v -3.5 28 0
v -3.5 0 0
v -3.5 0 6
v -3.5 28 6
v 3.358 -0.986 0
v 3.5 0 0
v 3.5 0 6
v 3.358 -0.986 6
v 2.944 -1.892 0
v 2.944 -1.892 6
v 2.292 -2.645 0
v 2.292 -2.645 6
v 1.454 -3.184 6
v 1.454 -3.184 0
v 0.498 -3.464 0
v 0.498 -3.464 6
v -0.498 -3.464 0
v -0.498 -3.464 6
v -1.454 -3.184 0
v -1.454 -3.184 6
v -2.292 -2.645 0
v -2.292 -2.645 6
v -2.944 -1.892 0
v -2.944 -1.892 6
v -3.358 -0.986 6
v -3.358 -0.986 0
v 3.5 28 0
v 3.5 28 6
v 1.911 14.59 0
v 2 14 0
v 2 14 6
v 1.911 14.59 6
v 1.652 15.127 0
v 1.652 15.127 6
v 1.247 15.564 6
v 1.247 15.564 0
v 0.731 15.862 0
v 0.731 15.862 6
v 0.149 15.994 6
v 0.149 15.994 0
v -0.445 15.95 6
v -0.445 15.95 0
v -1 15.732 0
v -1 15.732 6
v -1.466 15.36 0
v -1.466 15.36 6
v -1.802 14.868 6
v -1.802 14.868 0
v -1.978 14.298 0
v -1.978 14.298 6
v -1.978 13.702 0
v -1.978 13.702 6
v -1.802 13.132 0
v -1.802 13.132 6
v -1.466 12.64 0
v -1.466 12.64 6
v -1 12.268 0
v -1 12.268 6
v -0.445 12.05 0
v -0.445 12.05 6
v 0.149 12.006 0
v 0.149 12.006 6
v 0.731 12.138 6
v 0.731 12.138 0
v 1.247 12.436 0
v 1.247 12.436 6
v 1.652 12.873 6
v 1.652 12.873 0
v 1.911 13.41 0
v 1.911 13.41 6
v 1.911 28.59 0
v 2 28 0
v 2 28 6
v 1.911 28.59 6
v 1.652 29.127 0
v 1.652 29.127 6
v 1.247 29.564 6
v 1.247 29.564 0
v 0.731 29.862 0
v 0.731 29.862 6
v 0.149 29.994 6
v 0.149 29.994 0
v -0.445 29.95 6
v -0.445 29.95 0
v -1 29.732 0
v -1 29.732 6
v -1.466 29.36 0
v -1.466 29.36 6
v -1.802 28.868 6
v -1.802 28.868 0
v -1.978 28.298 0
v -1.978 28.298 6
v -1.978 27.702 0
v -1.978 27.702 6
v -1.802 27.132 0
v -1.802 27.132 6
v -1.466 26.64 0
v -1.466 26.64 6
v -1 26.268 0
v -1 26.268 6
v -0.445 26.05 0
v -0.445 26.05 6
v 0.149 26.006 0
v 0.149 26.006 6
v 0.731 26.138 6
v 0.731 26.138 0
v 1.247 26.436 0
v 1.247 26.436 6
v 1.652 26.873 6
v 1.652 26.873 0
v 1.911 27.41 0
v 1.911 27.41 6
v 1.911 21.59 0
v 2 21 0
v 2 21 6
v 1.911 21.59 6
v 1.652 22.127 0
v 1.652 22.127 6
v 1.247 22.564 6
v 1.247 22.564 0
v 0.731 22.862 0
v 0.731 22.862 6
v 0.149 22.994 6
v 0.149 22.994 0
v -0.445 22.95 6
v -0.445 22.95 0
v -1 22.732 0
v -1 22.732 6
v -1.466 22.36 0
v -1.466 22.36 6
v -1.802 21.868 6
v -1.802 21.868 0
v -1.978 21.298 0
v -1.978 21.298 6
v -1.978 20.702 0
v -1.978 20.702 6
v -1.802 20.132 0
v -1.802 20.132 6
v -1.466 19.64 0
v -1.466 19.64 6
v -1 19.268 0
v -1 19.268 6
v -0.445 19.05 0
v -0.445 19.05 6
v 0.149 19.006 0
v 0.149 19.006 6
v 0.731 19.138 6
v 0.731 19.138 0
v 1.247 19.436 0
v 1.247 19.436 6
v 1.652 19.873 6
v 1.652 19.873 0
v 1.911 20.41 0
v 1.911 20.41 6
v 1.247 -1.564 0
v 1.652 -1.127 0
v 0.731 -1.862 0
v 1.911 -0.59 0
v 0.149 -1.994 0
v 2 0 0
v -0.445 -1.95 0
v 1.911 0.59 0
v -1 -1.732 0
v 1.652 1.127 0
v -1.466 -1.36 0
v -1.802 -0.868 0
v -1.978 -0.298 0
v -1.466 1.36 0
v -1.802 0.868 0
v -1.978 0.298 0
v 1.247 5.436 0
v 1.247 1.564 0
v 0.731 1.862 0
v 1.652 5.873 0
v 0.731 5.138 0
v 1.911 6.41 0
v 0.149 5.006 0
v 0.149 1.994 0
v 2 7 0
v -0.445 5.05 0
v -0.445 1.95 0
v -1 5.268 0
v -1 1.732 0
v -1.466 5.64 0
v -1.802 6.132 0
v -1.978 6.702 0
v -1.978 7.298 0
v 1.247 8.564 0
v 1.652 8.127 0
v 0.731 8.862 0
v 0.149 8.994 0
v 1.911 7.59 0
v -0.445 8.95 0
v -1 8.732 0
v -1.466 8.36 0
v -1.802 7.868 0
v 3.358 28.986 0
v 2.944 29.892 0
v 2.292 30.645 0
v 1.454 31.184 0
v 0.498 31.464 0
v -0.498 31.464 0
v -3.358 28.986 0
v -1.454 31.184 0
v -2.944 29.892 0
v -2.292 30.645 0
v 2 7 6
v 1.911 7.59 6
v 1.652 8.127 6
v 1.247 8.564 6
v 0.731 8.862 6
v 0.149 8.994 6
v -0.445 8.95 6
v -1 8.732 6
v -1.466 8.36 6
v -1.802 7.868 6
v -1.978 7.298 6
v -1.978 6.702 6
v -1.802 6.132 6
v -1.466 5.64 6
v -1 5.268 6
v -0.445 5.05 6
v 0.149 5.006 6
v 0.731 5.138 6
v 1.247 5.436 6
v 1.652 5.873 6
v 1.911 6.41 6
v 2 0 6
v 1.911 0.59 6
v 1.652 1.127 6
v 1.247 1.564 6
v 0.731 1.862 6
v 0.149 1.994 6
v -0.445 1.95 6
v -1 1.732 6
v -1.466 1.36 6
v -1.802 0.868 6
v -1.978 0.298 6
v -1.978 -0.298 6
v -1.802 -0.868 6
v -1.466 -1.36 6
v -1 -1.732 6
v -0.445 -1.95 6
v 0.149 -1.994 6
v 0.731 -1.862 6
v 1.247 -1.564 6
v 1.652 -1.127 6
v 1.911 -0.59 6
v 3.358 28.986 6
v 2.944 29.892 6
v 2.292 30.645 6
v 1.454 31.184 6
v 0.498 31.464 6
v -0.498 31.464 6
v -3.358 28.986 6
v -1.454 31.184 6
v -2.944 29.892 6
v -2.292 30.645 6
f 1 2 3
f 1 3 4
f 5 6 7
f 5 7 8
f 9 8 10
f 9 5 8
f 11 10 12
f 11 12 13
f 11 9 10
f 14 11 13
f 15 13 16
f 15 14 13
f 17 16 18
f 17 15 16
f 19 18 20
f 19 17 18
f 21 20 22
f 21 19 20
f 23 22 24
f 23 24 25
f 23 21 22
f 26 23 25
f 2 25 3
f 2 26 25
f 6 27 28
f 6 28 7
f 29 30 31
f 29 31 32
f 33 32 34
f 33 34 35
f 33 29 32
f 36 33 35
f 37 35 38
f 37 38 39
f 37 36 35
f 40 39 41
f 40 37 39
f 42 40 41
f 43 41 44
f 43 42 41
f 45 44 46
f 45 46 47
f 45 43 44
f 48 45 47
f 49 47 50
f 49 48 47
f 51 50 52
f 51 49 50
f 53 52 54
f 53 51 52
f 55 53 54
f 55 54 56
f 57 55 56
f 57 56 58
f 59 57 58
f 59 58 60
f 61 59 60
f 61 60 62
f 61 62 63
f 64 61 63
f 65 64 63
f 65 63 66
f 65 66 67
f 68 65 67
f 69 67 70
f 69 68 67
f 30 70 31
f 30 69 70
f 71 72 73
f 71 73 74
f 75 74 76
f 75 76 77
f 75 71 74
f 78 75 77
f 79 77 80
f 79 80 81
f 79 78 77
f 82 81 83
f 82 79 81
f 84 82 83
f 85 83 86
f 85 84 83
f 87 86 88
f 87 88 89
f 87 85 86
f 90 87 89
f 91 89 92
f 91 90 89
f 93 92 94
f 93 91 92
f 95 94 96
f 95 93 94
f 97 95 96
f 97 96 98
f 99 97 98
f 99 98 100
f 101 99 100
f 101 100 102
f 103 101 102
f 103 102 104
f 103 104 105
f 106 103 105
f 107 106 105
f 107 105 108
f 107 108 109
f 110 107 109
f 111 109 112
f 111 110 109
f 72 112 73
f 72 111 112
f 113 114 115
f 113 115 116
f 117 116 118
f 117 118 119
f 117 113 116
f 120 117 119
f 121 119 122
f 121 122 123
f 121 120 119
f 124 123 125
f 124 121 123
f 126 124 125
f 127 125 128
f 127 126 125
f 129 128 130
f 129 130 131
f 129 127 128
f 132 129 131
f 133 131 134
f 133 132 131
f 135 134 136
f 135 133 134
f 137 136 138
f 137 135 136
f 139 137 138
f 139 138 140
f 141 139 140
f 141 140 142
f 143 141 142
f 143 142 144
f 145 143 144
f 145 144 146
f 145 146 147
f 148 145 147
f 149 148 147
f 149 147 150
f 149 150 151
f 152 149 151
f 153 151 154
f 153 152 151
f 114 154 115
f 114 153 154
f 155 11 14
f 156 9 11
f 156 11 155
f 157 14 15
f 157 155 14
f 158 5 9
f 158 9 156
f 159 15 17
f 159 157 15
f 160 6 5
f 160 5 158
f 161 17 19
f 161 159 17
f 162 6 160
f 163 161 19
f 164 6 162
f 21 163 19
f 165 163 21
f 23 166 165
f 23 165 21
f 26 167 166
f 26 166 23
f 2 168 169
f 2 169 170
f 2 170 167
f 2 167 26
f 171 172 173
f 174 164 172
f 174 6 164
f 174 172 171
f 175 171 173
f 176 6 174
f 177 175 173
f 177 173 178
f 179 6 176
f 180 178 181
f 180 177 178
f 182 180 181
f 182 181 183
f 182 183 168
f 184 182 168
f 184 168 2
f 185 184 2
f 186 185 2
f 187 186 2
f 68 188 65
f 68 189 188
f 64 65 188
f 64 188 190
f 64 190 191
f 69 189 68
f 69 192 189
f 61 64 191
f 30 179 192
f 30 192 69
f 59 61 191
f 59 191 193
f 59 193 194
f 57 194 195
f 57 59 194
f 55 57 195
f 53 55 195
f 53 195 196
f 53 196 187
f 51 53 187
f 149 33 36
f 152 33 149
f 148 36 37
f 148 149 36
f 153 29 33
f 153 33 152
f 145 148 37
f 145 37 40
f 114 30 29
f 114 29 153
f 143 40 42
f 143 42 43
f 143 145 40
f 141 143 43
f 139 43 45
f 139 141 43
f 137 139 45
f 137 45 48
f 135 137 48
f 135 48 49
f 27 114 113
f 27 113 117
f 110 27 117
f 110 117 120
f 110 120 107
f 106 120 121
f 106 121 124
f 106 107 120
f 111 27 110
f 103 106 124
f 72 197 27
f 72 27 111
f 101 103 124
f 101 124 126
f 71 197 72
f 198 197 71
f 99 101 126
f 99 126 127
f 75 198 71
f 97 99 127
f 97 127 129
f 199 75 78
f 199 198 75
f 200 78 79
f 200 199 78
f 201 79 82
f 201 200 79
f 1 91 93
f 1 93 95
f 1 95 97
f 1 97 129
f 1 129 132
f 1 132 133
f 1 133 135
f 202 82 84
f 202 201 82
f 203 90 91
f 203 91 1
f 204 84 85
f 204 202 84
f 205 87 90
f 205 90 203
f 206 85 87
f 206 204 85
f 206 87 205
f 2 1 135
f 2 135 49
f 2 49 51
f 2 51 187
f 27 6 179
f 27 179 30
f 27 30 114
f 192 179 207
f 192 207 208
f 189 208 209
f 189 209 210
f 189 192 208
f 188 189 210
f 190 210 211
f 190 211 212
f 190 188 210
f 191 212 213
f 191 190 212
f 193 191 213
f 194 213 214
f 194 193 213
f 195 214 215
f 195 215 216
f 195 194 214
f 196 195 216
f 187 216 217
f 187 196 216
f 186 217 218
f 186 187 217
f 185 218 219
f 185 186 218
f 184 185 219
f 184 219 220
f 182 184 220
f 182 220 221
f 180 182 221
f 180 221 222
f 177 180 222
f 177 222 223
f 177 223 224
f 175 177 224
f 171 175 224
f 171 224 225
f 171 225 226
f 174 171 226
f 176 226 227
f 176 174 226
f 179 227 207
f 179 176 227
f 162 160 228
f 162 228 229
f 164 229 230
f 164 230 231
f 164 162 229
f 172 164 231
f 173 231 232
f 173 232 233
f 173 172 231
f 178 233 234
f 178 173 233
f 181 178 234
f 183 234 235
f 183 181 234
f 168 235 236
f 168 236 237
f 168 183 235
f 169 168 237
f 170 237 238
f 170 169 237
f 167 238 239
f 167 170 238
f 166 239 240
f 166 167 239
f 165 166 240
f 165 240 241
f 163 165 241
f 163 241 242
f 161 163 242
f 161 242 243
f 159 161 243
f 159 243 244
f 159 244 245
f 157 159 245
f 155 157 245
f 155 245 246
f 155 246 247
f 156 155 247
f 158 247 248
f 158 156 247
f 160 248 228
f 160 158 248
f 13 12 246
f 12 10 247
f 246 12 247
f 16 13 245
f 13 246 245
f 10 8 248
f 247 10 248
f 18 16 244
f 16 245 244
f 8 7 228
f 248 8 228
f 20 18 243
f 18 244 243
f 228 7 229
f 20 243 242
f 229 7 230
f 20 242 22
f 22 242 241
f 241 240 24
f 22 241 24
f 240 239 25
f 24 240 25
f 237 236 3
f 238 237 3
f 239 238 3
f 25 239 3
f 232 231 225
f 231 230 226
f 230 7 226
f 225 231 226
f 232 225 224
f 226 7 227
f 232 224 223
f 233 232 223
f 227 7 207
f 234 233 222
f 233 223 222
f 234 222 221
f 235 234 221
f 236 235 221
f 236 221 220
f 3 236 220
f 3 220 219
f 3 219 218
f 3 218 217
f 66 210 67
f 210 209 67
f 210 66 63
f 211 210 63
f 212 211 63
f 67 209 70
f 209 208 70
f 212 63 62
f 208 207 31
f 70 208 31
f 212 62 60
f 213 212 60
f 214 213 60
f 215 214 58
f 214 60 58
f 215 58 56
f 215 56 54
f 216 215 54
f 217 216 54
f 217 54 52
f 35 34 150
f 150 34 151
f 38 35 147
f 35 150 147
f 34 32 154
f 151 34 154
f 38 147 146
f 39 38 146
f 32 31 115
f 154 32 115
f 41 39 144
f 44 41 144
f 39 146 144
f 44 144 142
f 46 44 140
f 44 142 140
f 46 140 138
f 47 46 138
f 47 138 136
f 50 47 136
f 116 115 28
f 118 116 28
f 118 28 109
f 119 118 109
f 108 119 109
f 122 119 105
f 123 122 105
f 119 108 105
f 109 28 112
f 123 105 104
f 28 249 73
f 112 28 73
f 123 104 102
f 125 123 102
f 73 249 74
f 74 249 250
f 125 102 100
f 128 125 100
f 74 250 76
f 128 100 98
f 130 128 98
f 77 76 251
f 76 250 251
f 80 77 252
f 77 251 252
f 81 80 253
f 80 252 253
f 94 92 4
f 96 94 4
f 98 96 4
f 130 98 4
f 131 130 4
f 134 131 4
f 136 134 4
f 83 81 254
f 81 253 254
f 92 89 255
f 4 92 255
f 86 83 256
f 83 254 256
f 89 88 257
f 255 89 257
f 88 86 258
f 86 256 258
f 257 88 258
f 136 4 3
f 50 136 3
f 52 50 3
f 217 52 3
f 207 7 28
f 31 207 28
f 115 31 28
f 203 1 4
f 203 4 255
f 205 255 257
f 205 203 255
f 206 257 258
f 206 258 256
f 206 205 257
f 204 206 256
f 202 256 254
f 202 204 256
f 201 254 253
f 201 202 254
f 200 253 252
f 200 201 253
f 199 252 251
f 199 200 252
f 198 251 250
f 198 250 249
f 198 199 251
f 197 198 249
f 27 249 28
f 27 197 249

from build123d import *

# Parameters (mm, degrees)
SKETCH1_R           = 2
BOSS_EXTRUDE1_DEPTH = 6


with BuildPart() as part:
    # Sketch1 → Boss-Extrude1 (new body)
    with BuildSketch(Plane.XY):
        with BuildLine():
            Line((-3.5, 0), (-3.5, 28))
            ThreePointArc((-3.5, 28), (0, 31.5), (3.5, 28))
            Line((3.5, 28), (3.5, 0))
            ThreePointArc((3.5, 0), (0, -3.5), (-3.5, 0))
        make_face()
        Circle(SKETCH1_R, mode=Mode.SUBTRACT)
        with Locations((0, 7)):
            Circle(SKETCH1_R, mode=Mode.SUBTRACT)
        with Locations((0, 14)):
            Circle(SKETCH1_R, mode=Mode.SUBTRACT)
        with Locations((0, 21)):
            Circle(SKETCH1_R, mode=Mode.SUBTRACT)
        with Locations((0, 28)):
            Circle(SKETCH1_R, mode=Mode.SUBTRACT)
    extrude(amount=BOSS_EXTRUDE1_DEPTH)


solid = part.part
